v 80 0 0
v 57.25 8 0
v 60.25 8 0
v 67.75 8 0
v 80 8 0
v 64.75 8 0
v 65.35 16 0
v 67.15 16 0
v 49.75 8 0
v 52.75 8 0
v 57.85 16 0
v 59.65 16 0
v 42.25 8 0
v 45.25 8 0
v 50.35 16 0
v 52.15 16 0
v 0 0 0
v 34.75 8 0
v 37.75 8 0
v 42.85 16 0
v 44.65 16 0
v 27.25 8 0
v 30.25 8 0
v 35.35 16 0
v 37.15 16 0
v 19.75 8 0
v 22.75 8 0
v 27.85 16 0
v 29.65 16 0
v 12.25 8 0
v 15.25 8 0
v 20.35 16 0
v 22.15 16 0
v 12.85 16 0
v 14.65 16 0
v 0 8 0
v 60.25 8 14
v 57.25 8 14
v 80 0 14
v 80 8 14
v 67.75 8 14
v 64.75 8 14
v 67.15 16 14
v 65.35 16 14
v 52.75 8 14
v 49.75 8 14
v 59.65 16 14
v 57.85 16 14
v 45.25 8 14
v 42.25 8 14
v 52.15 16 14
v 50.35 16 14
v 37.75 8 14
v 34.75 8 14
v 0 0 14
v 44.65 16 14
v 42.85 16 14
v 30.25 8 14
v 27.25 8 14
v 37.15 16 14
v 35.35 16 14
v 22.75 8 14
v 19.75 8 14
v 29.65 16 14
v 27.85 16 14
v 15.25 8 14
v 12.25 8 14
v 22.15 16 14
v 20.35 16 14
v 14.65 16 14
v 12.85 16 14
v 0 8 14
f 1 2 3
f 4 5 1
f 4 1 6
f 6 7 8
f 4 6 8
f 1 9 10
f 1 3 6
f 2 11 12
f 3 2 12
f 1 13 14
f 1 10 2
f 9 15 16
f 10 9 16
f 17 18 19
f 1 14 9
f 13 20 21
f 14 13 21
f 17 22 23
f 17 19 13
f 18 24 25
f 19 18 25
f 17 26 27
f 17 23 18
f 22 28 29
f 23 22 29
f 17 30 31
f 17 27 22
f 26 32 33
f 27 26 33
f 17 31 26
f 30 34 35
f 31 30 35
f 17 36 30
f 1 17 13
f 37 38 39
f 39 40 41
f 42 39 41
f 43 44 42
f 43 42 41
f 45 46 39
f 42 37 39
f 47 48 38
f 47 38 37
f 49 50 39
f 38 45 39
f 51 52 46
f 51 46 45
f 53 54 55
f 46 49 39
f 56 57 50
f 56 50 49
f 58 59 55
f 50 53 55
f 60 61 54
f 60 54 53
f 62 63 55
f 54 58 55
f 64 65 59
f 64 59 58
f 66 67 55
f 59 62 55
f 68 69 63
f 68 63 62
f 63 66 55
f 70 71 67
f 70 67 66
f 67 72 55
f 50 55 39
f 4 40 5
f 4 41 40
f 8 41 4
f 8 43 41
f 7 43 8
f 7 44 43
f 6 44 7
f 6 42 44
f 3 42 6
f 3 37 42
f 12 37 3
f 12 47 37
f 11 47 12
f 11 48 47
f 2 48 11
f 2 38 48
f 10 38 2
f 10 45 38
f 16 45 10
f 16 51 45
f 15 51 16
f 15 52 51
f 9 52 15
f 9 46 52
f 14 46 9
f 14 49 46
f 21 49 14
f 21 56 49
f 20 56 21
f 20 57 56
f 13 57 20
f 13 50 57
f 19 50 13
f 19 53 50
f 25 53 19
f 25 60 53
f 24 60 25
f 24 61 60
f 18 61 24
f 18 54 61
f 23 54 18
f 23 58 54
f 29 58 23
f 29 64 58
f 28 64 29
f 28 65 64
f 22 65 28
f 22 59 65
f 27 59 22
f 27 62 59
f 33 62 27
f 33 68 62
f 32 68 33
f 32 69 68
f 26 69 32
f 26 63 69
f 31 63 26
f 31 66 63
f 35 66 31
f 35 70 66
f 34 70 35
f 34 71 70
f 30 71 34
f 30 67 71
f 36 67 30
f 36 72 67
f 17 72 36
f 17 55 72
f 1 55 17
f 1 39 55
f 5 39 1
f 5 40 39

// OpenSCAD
$fn = 32;

// ----------------------------------------------------------------------
// Gear rack: 8 teeth on a 80 mm bar, pitch 7.5 mm
// ----------------------------------------------------------------------

// --- parameters (mm) ---
profile_height = 14;      // extrusion height
profile_points = 36;      // points of the closed outline

profile = [[0, 0], [80, 0], [80, 8], [67.75, 8], [67.15, 16], [65.35, 16], [64.75, 8], [60.25, 8], [59.65, 16], [57.85, 16], [57.25, 8], [52.75, 8], [52.15, 16], [50.35, 16], [49.75, 8], [45.25, 8], [44.65, 16], [42.85, 16], [42.25, 8], [37.75, 8], [37.15, 16], [35.35, 16], [34.75, 8], [30.25, 8], [29.65, 16], [27.85, 16], [27.25, 8], [22.75, 8], [22.15, 16], [20.35, 16], [19.75, 8], [15.25, 8], [14.65, 16], [12.85, 16], [12.25, 8], [0, 8]];  // single closed polygon, 36 points, counter clockwise

// --- the one profile operation ---
linear_extrude(height = profile_height) polygon(points = profile);
